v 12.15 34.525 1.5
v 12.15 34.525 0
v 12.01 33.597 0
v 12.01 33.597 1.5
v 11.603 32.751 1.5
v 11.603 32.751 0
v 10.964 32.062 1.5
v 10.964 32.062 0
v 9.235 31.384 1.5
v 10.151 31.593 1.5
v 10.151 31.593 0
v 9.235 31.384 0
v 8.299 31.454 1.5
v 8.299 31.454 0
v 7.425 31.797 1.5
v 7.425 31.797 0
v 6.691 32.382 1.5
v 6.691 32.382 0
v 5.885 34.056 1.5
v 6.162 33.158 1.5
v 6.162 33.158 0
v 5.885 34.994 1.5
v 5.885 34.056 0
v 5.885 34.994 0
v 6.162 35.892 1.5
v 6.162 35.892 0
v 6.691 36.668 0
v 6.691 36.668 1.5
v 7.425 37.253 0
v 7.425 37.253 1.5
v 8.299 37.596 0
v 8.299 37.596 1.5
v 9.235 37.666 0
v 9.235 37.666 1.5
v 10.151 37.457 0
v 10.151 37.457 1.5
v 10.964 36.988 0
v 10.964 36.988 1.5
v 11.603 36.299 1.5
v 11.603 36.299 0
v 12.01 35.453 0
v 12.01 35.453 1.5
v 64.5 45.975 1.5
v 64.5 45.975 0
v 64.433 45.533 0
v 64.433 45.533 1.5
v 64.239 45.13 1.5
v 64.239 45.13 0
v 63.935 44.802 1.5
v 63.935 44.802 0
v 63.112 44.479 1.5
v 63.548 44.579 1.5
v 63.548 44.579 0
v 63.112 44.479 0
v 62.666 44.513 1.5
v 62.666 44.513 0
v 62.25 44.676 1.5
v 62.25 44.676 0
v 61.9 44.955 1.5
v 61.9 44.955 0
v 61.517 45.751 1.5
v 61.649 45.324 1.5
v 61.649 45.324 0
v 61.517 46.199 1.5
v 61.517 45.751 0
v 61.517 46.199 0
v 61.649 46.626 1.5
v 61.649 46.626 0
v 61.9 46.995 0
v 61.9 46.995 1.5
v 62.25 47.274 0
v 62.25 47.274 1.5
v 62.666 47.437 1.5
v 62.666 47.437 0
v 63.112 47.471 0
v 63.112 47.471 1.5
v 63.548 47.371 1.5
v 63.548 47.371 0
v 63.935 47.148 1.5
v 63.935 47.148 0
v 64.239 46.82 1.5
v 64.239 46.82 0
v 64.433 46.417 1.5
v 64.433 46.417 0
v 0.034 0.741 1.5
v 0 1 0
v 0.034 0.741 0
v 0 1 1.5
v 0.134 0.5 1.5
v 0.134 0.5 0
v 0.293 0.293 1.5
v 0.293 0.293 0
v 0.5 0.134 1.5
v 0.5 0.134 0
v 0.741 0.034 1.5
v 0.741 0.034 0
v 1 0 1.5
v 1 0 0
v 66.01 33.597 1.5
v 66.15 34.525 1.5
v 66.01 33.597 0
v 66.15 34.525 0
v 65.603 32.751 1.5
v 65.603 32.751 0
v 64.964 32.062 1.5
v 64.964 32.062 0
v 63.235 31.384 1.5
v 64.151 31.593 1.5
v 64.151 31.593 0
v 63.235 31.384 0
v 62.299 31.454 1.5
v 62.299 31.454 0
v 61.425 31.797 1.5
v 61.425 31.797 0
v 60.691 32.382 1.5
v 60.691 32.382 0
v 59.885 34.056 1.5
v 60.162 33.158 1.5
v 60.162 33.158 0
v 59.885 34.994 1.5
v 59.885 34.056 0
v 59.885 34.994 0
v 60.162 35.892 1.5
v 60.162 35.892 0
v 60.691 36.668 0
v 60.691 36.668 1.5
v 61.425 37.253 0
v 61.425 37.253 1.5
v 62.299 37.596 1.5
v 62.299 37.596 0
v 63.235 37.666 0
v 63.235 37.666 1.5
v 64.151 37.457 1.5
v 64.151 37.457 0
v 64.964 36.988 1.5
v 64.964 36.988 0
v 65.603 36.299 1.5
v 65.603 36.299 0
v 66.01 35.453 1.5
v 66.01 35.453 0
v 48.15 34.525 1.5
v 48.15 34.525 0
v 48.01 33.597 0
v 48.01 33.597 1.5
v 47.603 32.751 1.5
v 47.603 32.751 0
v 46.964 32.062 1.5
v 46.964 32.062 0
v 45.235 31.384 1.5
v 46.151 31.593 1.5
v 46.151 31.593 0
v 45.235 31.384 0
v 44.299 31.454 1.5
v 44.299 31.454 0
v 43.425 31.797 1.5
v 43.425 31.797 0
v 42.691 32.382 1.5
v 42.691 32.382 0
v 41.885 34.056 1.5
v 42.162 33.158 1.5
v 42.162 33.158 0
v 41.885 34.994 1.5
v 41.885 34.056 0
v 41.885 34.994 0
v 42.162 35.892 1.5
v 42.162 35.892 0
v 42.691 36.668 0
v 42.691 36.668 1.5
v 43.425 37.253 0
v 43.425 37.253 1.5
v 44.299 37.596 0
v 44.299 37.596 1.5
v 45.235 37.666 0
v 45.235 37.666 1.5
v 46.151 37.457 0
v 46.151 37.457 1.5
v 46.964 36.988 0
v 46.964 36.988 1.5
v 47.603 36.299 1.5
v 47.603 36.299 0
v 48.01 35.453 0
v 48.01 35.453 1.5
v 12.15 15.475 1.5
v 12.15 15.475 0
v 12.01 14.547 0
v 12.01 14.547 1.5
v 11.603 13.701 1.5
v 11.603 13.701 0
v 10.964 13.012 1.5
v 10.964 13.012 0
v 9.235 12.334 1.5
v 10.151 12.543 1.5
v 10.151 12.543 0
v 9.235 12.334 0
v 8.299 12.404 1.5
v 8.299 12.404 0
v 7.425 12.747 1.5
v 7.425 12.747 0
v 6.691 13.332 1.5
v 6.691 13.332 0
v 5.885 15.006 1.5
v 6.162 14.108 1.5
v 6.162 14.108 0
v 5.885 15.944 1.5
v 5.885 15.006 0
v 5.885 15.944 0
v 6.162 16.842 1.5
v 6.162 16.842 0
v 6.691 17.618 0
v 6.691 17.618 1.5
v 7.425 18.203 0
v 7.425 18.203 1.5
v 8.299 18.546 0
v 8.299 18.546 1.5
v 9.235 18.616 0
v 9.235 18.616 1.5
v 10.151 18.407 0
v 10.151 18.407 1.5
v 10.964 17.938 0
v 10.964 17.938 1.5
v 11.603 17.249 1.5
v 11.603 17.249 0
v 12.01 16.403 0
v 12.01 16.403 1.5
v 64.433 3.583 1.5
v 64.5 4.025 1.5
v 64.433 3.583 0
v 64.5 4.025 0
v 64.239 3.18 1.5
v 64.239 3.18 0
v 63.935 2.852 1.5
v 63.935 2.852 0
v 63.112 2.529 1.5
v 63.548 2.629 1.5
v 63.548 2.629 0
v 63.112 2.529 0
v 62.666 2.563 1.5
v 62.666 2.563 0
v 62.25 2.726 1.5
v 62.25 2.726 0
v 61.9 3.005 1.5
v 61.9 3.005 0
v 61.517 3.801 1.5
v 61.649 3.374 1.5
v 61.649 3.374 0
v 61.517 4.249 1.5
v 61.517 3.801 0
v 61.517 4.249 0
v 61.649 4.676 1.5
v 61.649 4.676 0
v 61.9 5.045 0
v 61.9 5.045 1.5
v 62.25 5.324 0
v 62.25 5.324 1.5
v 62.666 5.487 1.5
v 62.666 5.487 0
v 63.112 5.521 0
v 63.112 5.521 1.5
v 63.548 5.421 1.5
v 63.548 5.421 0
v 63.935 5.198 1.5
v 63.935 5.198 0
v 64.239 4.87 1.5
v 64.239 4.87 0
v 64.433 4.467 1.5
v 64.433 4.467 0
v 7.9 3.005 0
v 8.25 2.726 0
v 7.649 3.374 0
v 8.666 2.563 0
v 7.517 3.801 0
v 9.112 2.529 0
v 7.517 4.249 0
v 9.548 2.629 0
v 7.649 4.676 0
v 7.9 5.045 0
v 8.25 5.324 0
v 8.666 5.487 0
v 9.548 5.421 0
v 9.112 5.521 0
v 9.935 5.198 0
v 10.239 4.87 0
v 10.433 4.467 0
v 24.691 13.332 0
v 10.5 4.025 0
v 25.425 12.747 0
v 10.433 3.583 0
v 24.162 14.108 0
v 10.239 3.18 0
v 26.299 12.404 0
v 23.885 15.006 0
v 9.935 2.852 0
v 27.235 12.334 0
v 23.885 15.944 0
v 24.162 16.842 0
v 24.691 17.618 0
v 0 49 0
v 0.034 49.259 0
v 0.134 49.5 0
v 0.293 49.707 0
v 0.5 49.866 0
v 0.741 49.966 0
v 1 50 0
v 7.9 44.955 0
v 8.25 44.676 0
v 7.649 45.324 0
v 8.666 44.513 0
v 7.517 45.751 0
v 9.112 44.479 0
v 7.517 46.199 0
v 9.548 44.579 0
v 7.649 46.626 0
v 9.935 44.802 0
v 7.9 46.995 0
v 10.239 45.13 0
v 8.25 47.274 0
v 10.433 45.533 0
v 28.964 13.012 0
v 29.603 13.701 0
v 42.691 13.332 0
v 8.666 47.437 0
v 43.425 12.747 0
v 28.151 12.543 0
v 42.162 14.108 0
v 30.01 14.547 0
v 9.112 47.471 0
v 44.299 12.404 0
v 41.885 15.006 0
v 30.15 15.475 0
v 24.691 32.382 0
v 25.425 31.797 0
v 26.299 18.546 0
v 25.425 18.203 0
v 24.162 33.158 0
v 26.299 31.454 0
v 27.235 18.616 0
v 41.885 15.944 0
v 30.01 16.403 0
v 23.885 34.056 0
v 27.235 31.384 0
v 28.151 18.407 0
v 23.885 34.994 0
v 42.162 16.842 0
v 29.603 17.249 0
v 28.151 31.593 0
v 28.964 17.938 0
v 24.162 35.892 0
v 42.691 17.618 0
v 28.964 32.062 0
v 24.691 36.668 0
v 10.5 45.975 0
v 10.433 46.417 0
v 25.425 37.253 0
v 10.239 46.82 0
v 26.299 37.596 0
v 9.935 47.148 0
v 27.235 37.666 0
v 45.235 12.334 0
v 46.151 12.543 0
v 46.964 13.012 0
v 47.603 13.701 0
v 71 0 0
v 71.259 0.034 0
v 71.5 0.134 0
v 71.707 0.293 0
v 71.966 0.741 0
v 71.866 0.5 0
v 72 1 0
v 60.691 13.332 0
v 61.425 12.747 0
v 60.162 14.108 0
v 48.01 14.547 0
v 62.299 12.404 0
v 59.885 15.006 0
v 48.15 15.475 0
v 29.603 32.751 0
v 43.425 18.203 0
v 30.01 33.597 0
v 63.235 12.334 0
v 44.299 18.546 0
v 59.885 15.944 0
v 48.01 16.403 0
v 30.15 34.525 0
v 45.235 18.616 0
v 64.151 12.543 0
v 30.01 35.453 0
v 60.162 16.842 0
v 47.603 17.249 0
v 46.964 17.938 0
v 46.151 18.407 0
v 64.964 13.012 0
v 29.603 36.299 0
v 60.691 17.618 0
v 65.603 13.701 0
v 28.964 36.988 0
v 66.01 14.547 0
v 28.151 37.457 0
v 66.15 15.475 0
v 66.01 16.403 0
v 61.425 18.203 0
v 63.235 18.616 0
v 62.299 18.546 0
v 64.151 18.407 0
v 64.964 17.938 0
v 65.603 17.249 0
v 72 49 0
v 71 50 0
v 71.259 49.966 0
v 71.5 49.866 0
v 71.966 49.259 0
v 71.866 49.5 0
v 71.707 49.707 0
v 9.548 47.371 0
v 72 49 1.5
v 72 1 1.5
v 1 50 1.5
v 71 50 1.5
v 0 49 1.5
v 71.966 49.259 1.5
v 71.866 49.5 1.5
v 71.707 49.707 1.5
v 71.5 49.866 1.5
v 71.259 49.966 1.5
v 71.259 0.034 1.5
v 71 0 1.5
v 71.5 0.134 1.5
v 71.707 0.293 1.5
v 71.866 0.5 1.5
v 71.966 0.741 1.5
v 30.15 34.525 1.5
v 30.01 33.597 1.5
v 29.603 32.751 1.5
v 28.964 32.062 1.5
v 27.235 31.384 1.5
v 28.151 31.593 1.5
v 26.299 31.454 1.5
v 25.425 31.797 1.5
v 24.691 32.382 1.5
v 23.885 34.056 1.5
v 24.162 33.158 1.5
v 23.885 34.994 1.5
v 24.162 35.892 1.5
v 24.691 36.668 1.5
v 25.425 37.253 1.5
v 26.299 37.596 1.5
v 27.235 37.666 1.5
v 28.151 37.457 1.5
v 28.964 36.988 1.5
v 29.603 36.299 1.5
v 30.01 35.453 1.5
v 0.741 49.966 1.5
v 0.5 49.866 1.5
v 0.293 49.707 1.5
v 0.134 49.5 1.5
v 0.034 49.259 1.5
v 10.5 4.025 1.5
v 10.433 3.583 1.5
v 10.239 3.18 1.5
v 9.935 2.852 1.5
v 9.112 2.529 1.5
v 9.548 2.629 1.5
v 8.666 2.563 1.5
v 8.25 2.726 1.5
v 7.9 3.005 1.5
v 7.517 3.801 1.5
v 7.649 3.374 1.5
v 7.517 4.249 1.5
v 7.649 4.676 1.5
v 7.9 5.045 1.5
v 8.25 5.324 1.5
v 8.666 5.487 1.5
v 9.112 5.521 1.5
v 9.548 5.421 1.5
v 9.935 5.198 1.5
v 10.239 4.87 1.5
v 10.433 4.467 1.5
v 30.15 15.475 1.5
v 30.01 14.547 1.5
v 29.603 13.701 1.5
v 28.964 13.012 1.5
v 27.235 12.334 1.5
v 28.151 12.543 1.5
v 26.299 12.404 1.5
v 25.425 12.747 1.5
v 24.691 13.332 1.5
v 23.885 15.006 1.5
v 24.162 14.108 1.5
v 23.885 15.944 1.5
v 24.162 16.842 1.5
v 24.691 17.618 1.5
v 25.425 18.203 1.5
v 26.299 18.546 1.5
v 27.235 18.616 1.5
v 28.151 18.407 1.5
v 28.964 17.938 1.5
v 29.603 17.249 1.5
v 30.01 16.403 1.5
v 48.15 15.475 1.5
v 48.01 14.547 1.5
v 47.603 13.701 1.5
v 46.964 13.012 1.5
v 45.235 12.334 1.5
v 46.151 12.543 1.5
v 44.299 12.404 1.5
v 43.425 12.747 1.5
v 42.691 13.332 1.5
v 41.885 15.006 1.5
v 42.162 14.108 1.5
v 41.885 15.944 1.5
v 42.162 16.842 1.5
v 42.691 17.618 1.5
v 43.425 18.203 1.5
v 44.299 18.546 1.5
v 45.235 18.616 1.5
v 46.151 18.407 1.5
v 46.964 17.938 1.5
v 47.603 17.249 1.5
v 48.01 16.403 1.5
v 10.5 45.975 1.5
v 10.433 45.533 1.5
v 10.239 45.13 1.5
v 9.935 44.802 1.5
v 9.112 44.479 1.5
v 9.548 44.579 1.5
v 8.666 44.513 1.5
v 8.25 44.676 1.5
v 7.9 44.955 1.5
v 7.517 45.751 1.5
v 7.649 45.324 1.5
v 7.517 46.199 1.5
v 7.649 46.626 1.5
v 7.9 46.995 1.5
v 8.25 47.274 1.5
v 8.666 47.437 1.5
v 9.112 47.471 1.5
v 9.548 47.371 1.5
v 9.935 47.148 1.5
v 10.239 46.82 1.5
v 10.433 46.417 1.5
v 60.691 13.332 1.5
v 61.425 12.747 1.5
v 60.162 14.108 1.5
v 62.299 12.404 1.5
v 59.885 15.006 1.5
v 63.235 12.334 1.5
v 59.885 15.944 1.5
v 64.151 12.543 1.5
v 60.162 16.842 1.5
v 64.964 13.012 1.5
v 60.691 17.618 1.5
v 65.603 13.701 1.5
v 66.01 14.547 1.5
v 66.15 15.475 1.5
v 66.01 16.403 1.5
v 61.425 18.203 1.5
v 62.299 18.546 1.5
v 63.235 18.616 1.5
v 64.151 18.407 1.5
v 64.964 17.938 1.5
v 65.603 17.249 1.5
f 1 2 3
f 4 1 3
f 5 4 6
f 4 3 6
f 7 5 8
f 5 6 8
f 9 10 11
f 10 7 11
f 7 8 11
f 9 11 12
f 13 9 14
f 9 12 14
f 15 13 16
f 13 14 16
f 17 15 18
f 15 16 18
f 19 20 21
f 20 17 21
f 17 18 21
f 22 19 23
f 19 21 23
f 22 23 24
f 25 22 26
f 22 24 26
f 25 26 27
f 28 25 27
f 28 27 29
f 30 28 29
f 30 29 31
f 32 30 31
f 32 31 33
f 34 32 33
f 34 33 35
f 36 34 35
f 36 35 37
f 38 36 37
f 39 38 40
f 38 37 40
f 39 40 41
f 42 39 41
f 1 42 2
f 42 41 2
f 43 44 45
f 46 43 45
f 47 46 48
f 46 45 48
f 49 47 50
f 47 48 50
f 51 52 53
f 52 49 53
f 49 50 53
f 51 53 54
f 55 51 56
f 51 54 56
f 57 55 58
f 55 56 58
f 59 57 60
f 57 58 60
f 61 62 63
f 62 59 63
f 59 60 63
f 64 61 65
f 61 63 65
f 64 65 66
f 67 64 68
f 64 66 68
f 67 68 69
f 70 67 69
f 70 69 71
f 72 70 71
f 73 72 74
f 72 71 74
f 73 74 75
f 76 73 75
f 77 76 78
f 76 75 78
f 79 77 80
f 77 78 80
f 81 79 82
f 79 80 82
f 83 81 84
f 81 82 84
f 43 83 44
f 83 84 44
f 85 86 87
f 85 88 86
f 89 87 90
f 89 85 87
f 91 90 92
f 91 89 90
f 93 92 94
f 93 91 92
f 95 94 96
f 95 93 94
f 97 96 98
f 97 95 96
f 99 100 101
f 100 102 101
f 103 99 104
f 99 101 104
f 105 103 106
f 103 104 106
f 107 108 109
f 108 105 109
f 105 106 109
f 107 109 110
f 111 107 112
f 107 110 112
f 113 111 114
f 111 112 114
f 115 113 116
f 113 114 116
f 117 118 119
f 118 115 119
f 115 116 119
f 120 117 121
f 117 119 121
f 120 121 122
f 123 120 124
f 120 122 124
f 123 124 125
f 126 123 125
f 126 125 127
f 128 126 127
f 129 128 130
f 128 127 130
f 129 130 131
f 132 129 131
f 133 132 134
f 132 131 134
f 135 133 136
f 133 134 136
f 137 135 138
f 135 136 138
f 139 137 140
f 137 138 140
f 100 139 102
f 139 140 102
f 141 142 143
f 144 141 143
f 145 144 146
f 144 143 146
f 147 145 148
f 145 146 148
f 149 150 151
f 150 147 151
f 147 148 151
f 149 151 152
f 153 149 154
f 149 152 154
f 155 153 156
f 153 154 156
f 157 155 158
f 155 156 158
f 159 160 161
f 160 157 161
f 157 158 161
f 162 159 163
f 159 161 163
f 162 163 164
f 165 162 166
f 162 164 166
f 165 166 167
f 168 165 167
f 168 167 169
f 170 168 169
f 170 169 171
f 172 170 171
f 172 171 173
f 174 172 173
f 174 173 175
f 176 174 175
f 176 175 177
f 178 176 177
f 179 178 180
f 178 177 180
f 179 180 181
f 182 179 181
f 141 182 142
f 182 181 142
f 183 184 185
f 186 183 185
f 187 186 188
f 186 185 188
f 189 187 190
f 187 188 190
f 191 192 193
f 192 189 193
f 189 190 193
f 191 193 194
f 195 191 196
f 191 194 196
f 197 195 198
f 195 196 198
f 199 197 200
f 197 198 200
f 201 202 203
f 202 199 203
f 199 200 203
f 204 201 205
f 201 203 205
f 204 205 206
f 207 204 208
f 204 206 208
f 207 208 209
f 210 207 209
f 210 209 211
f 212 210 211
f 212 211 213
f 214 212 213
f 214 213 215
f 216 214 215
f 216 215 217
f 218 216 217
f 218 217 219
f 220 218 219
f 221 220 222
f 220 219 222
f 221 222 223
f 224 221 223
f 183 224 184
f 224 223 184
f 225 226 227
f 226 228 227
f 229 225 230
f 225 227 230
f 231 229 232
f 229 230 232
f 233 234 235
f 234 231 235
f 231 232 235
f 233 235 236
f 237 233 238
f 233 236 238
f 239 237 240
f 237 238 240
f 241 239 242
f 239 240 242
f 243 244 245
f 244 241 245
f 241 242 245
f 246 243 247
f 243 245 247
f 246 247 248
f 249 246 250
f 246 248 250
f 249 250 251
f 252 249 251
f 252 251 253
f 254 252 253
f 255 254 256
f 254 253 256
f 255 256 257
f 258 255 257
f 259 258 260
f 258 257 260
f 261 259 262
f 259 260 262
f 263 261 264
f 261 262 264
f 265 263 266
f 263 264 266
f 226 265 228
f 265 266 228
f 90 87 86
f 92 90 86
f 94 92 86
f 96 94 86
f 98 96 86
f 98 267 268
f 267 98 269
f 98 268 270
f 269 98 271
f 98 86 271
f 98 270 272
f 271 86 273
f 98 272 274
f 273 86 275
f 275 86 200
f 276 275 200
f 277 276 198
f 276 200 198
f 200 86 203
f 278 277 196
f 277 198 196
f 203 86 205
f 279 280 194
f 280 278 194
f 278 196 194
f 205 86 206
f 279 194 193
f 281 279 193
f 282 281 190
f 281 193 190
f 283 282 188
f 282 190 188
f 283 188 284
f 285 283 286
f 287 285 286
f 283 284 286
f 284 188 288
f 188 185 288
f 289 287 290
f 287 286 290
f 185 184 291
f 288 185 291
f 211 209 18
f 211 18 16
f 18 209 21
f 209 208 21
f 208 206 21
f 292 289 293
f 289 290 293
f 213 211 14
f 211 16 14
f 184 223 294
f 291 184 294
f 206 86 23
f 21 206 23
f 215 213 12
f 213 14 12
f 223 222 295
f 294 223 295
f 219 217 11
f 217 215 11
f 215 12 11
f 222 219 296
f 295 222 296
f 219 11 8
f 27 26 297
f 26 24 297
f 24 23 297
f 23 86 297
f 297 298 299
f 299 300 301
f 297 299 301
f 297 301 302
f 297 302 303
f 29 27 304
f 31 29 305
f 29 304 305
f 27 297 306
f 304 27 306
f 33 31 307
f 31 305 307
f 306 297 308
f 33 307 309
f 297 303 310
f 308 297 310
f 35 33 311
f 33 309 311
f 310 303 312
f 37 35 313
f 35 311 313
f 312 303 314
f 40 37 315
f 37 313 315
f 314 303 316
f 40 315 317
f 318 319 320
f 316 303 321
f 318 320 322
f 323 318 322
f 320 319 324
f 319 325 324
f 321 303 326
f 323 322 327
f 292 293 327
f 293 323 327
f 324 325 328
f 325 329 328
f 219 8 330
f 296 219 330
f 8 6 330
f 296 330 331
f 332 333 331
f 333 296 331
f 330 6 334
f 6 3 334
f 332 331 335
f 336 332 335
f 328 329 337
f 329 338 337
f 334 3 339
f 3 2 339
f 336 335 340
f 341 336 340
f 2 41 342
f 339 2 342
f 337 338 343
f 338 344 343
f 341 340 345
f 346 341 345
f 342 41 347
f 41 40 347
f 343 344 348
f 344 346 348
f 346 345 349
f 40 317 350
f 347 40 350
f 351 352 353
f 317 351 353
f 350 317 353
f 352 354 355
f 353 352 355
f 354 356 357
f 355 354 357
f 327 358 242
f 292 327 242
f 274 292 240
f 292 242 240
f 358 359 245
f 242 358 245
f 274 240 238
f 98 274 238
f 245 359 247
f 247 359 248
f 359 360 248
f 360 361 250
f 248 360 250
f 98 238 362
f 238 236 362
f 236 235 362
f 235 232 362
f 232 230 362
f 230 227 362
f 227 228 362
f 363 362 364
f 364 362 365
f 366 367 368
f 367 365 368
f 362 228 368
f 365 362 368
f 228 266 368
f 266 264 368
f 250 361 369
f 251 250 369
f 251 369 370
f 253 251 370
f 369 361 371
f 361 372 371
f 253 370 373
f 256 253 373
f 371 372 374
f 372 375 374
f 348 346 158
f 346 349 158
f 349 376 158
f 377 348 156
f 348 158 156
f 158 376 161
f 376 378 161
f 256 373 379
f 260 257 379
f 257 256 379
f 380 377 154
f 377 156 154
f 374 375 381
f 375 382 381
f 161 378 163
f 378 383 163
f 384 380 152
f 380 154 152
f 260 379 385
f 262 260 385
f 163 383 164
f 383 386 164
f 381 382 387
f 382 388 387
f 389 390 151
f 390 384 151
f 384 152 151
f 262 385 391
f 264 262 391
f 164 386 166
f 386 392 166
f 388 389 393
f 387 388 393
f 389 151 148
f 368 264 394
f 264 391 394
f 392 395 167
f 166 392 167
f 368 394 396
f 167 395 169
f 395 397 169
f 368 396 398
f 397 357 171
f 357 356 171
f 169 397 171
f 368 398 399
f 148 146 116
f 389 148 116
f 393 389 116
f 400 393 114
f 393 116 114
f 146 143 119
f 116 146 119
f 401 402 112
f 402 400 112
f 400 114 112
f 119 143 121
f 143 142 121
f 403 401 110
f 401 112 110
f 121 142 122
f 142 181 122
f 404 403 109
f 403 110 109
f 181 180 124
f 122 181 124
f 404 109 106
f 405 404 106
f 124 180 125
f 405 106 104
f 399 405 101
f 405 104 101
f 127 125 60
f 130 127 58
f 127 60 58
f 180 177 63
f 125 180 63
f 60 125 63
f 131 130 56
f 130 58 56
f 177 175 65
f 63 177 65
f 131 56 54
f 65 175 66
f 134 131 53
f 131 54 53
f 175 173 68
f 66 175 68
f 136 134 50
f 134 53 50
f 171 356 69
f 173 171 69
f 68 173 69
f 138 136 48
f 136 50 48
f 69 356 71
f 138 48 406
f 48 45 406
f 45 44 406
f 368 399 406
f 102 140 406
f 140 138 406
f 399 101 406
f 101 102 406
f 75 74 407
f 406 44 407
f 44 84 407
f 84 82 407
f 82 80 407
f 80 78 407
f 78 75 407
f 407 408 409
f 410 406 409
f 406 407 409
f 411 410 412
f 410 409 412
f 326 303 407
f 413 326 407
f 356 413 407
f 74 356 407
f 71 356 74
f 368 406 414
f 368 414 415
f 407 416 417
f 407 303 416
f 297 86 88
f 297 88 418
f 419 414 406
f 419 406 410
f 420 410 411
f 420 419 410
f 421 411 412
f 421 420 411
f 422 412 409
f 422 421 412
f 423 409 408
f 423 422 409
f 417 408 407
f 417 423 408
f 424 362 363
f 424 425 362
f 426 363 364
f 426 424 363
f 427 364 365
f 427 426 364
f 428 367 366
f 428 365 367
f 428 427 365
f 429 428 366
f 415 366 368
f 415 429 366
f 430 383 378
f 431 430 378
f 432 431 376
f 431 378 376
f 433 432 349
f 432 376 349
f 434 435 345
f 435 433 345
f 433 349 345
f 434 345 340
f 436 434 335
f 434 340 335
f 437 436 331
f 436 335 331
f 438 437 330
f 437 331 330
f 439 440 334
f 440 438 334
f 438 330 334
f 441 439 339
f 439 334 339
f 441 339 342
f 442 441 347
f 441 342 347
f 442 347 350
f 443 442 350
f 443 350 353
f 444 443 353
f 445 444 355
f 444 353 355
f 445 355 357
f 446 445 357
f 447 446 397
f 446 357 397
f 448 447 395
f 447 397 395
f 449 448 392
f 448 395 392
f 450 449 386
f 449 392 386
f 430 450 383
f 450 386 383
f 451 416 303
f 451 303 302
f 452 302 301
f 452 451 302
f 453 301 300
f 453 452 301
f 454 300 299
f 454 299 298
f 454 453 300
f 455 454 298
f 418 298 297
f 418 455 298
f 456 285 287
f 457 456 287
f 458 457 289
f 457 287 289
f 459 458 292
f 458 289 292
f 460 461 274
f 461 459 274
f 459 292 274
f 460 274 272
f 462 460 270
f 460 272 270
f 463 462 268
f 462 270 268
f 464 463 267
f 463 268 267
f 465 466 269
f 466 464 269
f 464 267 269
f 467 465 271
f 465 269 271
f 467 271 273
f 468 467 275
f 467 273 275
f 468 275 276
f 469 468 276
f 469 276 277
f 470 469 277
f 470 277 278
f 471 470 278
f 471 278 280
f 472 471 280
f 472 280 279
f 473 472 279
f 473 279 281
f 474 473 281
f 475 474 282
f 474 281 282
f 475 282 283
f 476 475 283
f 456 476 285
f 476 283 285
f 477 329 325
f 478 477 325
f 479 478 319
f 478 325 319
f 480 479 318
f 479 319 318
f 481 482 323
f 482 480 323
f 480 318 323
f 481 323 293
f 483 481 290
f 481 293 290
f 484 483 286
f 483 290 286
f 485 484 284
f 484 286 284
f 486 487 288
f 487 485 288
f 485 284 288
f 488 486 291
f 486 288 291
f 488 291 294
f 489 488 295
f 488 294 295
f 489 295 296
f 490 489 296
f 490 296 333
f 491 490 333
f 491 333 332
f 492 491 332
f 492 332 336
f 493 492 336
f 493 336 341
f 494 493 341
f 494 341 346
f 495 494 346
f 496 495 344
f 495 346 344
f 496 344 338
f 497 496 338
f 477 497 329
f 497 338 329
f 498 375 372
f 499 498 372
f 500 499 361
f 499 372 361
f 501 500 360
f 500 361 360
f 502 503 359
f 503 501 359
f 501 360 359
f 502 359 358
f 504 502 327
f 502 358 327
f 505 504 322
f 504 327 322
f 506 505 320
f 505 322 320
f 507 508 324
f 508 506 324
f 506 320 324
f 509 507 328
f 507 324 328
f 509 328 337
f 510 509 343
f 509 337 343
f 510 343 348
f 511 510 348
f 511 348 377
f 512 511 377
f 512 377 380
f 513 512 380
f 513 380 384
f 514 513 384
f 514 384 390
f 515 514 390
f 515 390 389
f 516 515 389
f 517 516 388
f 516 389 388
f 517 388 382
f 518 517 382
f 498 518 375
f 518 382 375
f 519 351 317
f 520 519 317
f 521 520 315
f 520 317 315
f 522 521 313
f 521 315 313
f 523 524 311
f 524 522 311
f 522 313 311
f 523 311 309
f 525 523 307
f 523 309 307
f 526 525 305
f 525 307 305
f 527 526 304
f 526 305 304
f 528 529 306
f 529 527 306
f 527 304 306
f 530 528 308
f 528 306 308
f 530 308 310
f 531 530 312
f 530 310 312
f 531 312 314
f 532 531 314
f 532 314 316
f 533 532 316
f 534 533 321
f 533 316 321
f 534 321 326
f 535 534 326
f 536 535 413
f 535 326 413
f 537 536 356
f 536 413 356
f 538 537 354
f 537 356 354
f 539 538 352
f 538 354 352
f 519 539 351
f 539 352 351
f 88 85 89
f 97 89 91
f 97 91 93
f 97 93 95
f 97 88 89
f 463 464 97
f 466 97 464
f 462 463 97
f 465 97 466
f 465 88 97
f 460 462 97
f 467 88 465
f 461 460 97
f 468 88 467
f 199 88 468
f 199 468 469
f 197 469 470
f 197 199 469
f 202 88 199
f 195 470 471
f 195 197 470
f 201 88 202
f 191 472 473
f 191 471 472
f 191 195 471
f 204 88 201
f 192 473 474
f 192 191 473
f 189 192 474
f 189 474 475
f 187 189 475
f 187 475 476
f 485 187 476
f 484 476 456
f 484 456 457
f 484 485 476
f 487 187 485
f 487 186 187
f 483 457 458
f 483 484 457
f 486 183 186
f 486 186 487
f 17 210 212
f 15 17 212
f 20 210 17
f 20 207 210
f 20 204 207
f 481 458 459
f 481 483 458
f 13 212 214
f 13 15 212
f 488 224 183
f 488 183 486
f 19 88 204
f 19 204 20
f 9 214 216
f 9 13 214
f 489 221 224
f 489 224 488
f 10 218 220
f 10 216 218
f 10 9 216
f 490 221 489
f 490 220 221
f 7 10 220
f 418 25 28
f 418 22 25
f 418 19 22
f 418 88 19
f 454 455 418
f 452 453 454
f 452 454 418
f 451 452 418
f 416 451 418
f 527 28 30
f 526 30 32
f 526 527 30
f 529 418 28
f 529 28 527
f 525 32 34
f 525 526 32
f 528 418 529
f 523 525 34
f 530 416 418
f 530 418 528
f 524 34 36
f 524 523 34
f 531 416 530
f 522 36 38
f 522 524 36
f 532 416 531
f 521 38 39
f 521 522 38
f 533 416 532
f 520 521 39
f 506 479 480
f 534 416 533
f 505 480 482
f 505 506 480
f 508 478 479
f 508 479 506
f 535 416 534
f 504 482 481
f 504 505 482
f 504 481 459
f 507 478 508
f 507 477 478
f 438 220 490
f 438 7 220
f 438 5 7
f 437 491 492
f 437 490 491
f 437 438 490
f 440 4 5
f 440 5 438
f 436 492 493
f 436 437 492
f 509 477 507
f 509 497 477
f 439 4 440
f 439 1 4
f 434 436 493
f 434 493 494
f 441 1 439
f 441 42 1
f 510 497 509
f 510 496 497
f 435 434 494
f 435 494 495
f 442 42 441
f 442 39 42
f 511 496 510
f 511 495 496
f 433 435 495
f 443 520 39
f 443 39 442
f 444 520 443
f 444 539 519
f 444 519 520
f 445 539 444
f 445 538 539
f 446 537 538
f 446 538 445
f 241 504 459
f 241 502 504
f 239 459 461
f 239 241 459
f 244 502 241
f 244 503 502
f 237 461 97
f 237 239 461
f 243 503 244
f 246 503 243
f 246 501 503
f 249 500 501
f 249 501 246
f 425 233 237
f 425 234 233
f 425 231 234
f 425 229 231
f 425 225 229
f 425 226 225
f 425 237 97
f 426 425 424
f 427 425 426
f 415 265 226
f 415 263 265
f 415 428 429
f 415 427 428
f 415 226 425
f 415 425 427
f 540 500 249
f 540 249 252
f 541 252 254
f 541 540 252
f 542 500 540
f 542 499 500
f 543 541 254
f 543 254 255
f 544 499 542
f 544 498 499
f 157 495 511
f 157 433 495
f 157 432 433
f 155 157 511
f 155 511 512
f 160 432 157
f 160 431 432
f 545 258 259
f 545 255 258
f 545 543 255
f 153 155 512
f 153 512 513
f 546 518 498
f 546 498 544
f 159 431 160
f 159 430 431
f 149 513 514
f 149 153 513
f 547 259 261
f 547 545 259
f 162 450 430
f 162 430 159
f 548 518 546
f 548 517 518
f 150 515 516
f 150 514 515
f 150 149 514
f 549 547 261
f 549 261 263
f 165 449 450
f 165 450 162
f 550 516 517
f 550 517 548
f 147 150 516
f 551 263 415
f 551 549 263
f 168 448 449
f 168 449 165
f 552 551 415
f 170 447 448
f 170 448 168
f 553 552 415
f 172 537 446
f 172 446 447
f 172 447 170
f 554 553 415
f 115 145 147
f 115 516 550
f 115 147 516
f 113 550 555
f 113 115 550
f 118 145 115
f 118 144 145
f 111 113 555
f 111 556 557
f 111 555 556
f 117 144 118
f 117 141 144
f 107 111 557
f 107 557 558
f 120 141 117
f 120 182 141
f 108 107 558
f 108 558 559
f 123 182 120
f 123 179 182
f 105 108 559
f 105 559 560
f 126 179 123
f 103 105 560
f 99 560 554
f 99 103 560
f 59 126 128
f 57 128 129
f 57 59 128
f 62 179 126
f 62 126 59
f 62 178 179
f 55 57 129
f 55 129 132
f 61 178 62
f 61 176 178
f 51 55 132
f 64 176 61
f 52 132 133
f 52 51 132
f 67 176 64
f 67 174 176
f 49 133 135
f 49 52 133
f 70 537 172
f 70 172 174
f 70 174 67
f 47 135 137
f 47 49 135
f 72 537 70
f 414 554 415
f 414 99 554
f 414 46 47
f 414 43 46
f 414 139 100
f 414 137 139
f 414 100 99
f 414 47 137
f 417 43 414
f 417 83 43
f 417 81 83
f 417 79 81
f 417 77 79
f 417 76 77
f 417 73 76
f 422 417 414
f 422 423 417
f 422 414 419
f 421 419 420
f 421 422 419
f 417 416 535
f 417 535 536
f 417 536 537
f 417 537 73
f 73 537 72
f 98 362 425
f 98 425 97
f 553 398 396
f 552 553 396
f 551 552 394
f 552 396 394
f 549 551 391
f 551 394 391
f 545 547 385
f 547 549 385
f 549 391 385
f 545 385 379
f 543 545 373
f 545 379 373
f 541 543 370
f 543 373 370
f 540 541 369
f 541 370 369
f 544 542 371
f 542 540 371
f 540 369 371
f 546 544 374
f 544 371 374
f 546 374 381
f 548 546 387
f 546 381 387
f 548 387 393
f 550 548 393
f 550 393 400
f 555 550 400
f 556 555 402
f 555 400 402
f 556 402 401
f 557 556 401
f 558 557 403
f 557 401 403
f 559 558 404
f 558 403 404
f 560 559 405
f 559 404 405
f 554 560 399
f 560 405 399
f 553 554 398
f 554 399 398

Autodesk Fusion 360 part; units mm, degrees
sketch "Sketch1" plane through (0, 0, 0) normal (0, 0, 1) x (1, 0, 0)
  circle A0 centre (9, 34.525) radius 3.95
  circle A1 centre (9, 15.475) radius 3.95
  line L0 (9, 34.525) -> (9, 15.475) construction
  circle A2 centre (9, 45.975) radius 1.5
  circle A3 centre (9, 4.025) radius 1.5
  line L1 (-1.2896, 25) -> (19.2896, 25) construction
  line L2 (9, 45.975) -> (9, 4.025) construction
  line L3 (5.7, 40.3994) -> (5.7, 10.52)
  line L4 (5.7, 10.52) -> (12.3, 10.52) construction
  line L5 (12.3, 10.52) -> (12.3, 40.3994)
  line L6 (12.3, 40.3994) -> (5.7, 40.3994) construction
  line L7 (5.05, 34.525) -> (12.95, 34.525) construction
  circle A4 centre (27, 34.525) radius 3.95
  line L8 (23.7, 40.3994) -> (23.7, 10.52)
  line L9 (30.3, 10.52) -> (30.3, 40.3994)
  circle A5 centre (27, 15.475) radius 3.95
  circle A6 centre (27, 4.025) radius 1.5
  circle A7 centre (27, 45.975) radius 1.5
  circle A8 centre (45, 34.525) radius 3.95
  line L10 (41.7, 40.3994) -> (41.7, 10.52)
  line L11 (48.3, 10.52) -> (48.3, 40.3994)
  circle A9 centre (45, 15.475) radius 3.95
  circle A10 centre (45, 4.025) radius 1.5
  circle A11 centre (45, 45.975) radius 1.5
  line L12 (0, 50) -> (72, 50)
  line L13 (72, 50) -> (72, 0)
  line L14 (72, 0) -> (0, 0)
  line L15 (0, 0) -> (0, 50)
  line L16 (27, 45.975) -> (27, 4.025) construction
  line L17 (45, 45.975) -> (45, 4.025) construction
  circle A12 centre (63, 34.525) radius 3.95
  line L18 (59.7, 40.3994) -> (59.7, 10.52)
  line L19 (66.3, 10.52) -> (66.3, 40.3994)
  circle A13 centre (63, 15.475) radius 3.95
  circle A14 centre (63, 4.025) radius 1.5
  circle A15 centre (63, 45.975) radius 1.5
  line L20 (63, 45.975) -> (63, 4.025) construction
  line L21 (36, 50) -> (36, 0) construction
  line L22 (0, 25) -> (72, 25) construction
  line L23 (9, 15.475) -> (27, 15.475) construction
  line L24 (18, 15.475) -> (18, 27.912) construction
  point P0 (9, 5.525)
  point P1 (9, 11.525)
  point P2 (27, 34.525)
  point P3 (27, 15.475)
  point P4 (45, 34.525)
  point P5 (45, 15.475)
  point P6 (63, 34.525)
  point P7 (63, 15.475)
  point P8 (45, -15.475)
  point P9 (0, -50)
  point P10 (0, -25)
  point P11 (45, -45.975)
  point P12 (45, -34.525)
  point P13 (0, 50)
  dimension "d4" = 7.9
  dimension "d5" = 7.9
  dimension "d6" = 19.05
  dimension "d7" = 6
  dimension "d8" = 3
  dimension "d9" = 0.65
  dimension "d12" = 18
  dimension "d13" = 0
  dimension "d19" = 50
  dimension "d24" = 41.95
  dimension "d34" = 9
  dimension "d35" = 9
  dimension "d36" = 9
extrude "Extrude1" add sketch "Sketch1" along normal blind 1.5 contours A0 L5 | A0 A1 L3 L5 | A0 L3 | A1 L5 | A1 L3 | A4 L9 | A4 L8 L9 A5 | A4 L8 | L9 A5 | L8 A5 | A6 | A7 | A8 L11 | A8 L10 L11 A9 | A8 L10 | L11 A9 | L10 A9 | A10 | A11 | L12 L13 L14 L15 | A12 L19 | A12 L18 L19 A13 | A12 L18 | L19 A13 | L18 A13 makes body 1
sketch "Sketch2" plane through (0, 0, 0) normal (0, 0, -1) x (1, 0, 0)
  circle A0 centre (9, -4.025) radius 1.5
  circle A1 centre (63, -4.025) radius 1.5
  arc A2 (12.3, -13.3042) -> (5.7, -13.3042) centre (9, -15.475) ccw construction
  line L0 (12.3, -13.3042) -> (12.3, -17.6458) construction
  arc A3 (5.7, -17.6458) -> (12.3, -17.6458) centre (9, -15.475) ccw construction
  line L1 (5.7, -17.6458) -> (5.7, -13.3042) construction
  line L2 (30.3, -13.3042) -> (30.3, -17.6458) construction
  arc A4 (23.7, -17.6458) -> (30.3, -17.6458) centre (27, -15.475) ccw construction
  line L3 (23.7, -17.6458) -> (23.7, -13.3042) construction
  arc A5 (30.3, -13.3042) -> (23.7, -13.3042) centre (27, -15.475) ccw construction
  circle A6 centre (63, -45.975) radius 1.5
  line L4 (48.3, -13.3042) -> (48.3, -17.6458) construction
  arc A7 (41.7, -17.6458) -> (48.3, -17.6458) centre (45, -15.475) ccw construction
  line L5 (41.7, -17.6458) -> (41.7, -13.3042) construction
  arc A8 (48.3, -13.3042) -> (41.7, -13.3042) centre (45, -15.475) ccw construction
  circle A9 centre (9, -45.975) radius 1.5
  line L6 (66.3, -13.3042) -> (66.3, -17.6458) construction
  arc A10 (59.7, -17.6458) -> (66.3, -17.6458) centre (63, -15.475) ccw construction
  line L7 (59.7, -17.6458) -> (59.7, -13.3042) construction
  arc A11 (66.3, -13.3042) -> (59.7, -13.3042) centre (63, -15.475) ccw construction
  line L8 (72, 0) -> (0, 0)
  line L9 (0, 0) -> (0, -50)
  line L10 (0, -50) -> (72, -50)
  line L11 (72, -50) -> (72, 0)
  line L12 (0.4311, -10.2537) -> (71.5689, -10.2537)
  line L13 (71.5689, -10.2537) -> (71.5689, -39.7463)
  line L14 (71.5689, -39.7463) -> (0.4311, -39.7463)
  line L15 (0.4311, -39.7463) -> (0.4311, -10.2537)
  line L16 (0, -25) -> (72, -25) construction
  line L17 (27, -45.975) -> (27, -4.025) construction
  line L18 (45, -45.975) -> (45, -4.025) construction
  line L19 (63, -45.975) -> (63, -4.025) construction
  line L20 (9, -45.975) -> (9, -4.025) construction
  line L21 (36, 0) -> (36, -50) construction
  line L22 (73.0689, -8.7537) -> (73.0689, -41.2463)
  line L23 (73.0689, -41.2463) -> (-1.0689, -41.2463)
  line L24 (-1.0689, -41.2463) -> (-1.0689, -8.7537)
  line L25 (-1.0689, -8.7537) -> (73.0689, -8.7537)
  arc A12 (12.3, -32.3542) -> (5.7, -32.3542) centre (9, -34.525) ccw
  line L26 (12.3, -32.3542) -> (12.3, -36.6958)
  arc A13 (5.7, -36.6958) -> (12.3, -36.6958) centre (9, -34.525) ccw
  line L27 (5.7, -36.6958) -> (5.7, -32.3542)
  arc A14 (66.3, -32.3542) -> (59.7, -32.3542) centre (63, -34.525) ccw
  line L28 (66.3, -32.3542) -> (66.3, -36.6958)
  arc A15 (59.7, -36.6958) -> (66.3, -36.6958) centre (63, -34.525) ccw
  line L29 (59.7, -36.6958) -> (59.7, -32.3542)
  arc A16 (30.3, -32.3542) -> (23.7, -32.3542) centre (27, -34.525) ccw
  line L30 (30.3, -32.3542) -> (30.3, -36.6958)
  arc A17 (23.7, -36.6958) -> (30.3, -36.6958) centre (27, -34.525) ccw
  line L31 (23.7, -36.6958) -> (23.7, -32.3542)
  arc A18 (48.3, -32.3542) -> (41.7, -32.3542) centre (45, -34.525) ccw
  line L32 (48.3, -32.3542) -> (48.3, -36.6958)
  arc A19 (41.7, -36.6958) -> (48.3, -36.6958) centre (45, -34.525) ccw
  line L33 (41.7, -36.6958) -> (41.7, -32.3542)
  dimension "d18" = -1.5
sketch "Sketch3" plane through (0, 0, 0) normal (0, 0, 1) x (1, 0, 0)
  line L0 (0, 50) -> (72, 50)
  line L1 (72, 50) -> (72, 0)
  line L2 (72, 0) -> (0, 0)
  line L3 (0, 0) -> (0, 50)
  circle A0 centre (9, 45.975) radius 1.5
  circle A1 centre (9, 4.025) radius 1.5
  circle A2 centre (9, 34.525) radius 3.15
  circle A3 centre (9, 15.475) radius 3.15
  circle A4 centre (27, 34.525) radius 3.15
  circle A5 centre (27, 45.975) radius 1.5
  circle A6 centre (27, 15.475) radius 3.15
  circle A7 centre (27, 4.025) radius 1.5
  circle A8 centre (45, 34.525) radius 3.15
  circle A9 centre (45, 45.975) radius 1.5
  circle A10 centre (45, 15.475) radius 3.15
  circle A11 centre (45, 4.025) radius 1.5
  circle A12 centre (63, 34.525) radius 3.15
  circle A13 centre (63, 45.975) radius 1.5
  circle A14 centre (63, 15.475) radius 3.15
  circle A15 centre (63, 4.025) radius 1.5
  point P0 (0, 50)
  point P1 (72, 0)
  point P2 (9, 45.975)
  point P3 (9, 4.025)
  point P4 (9, 34.525)
  point P5 (9, 15.475)
  point P6 (27, 15.475)
  point P7 (27, 4.025)
  point P8 (45, 15.475)
  point P9 (45, 4.025)
  point P10 (63, 15.475)
  point P11 (63, 4.025)
  dimension "d25" = 6.3
  dimension "d26" = 6.3
  dimension "d29" = 18
  dimension "d30" = 0
extrude "Extrude3" add sketch "Sketch3" along normal blind 1.5 separate body contours L0 L1 L2 L3 | A5 | A7 | A9 | A11 makes body 2
fillet "Fillet1" radius 1 4 edges at (72, 0, 0.75) (0, 0, 0.75) (72, 50, 0.75) (0, 50, 0.75) on bodies 2
hidden bodies 1
equation "banana_d = 7.9 mm"
equation "ctr_to_ctr = 0.75 in"
equation "flat_inset = 0.65 mm"
equation "d4 = banana_d"
equation "d5 = banana_d"
equation "d6 = ctr_to_ctr"
equation "d7 = 5 mm + 1 mm"
equation "d9 = flat_inset"
equation "x_spacing = 18 mm"
equation "d26 = d25"
equation "d29 = x_spacing"
equation "d36 = d35"
